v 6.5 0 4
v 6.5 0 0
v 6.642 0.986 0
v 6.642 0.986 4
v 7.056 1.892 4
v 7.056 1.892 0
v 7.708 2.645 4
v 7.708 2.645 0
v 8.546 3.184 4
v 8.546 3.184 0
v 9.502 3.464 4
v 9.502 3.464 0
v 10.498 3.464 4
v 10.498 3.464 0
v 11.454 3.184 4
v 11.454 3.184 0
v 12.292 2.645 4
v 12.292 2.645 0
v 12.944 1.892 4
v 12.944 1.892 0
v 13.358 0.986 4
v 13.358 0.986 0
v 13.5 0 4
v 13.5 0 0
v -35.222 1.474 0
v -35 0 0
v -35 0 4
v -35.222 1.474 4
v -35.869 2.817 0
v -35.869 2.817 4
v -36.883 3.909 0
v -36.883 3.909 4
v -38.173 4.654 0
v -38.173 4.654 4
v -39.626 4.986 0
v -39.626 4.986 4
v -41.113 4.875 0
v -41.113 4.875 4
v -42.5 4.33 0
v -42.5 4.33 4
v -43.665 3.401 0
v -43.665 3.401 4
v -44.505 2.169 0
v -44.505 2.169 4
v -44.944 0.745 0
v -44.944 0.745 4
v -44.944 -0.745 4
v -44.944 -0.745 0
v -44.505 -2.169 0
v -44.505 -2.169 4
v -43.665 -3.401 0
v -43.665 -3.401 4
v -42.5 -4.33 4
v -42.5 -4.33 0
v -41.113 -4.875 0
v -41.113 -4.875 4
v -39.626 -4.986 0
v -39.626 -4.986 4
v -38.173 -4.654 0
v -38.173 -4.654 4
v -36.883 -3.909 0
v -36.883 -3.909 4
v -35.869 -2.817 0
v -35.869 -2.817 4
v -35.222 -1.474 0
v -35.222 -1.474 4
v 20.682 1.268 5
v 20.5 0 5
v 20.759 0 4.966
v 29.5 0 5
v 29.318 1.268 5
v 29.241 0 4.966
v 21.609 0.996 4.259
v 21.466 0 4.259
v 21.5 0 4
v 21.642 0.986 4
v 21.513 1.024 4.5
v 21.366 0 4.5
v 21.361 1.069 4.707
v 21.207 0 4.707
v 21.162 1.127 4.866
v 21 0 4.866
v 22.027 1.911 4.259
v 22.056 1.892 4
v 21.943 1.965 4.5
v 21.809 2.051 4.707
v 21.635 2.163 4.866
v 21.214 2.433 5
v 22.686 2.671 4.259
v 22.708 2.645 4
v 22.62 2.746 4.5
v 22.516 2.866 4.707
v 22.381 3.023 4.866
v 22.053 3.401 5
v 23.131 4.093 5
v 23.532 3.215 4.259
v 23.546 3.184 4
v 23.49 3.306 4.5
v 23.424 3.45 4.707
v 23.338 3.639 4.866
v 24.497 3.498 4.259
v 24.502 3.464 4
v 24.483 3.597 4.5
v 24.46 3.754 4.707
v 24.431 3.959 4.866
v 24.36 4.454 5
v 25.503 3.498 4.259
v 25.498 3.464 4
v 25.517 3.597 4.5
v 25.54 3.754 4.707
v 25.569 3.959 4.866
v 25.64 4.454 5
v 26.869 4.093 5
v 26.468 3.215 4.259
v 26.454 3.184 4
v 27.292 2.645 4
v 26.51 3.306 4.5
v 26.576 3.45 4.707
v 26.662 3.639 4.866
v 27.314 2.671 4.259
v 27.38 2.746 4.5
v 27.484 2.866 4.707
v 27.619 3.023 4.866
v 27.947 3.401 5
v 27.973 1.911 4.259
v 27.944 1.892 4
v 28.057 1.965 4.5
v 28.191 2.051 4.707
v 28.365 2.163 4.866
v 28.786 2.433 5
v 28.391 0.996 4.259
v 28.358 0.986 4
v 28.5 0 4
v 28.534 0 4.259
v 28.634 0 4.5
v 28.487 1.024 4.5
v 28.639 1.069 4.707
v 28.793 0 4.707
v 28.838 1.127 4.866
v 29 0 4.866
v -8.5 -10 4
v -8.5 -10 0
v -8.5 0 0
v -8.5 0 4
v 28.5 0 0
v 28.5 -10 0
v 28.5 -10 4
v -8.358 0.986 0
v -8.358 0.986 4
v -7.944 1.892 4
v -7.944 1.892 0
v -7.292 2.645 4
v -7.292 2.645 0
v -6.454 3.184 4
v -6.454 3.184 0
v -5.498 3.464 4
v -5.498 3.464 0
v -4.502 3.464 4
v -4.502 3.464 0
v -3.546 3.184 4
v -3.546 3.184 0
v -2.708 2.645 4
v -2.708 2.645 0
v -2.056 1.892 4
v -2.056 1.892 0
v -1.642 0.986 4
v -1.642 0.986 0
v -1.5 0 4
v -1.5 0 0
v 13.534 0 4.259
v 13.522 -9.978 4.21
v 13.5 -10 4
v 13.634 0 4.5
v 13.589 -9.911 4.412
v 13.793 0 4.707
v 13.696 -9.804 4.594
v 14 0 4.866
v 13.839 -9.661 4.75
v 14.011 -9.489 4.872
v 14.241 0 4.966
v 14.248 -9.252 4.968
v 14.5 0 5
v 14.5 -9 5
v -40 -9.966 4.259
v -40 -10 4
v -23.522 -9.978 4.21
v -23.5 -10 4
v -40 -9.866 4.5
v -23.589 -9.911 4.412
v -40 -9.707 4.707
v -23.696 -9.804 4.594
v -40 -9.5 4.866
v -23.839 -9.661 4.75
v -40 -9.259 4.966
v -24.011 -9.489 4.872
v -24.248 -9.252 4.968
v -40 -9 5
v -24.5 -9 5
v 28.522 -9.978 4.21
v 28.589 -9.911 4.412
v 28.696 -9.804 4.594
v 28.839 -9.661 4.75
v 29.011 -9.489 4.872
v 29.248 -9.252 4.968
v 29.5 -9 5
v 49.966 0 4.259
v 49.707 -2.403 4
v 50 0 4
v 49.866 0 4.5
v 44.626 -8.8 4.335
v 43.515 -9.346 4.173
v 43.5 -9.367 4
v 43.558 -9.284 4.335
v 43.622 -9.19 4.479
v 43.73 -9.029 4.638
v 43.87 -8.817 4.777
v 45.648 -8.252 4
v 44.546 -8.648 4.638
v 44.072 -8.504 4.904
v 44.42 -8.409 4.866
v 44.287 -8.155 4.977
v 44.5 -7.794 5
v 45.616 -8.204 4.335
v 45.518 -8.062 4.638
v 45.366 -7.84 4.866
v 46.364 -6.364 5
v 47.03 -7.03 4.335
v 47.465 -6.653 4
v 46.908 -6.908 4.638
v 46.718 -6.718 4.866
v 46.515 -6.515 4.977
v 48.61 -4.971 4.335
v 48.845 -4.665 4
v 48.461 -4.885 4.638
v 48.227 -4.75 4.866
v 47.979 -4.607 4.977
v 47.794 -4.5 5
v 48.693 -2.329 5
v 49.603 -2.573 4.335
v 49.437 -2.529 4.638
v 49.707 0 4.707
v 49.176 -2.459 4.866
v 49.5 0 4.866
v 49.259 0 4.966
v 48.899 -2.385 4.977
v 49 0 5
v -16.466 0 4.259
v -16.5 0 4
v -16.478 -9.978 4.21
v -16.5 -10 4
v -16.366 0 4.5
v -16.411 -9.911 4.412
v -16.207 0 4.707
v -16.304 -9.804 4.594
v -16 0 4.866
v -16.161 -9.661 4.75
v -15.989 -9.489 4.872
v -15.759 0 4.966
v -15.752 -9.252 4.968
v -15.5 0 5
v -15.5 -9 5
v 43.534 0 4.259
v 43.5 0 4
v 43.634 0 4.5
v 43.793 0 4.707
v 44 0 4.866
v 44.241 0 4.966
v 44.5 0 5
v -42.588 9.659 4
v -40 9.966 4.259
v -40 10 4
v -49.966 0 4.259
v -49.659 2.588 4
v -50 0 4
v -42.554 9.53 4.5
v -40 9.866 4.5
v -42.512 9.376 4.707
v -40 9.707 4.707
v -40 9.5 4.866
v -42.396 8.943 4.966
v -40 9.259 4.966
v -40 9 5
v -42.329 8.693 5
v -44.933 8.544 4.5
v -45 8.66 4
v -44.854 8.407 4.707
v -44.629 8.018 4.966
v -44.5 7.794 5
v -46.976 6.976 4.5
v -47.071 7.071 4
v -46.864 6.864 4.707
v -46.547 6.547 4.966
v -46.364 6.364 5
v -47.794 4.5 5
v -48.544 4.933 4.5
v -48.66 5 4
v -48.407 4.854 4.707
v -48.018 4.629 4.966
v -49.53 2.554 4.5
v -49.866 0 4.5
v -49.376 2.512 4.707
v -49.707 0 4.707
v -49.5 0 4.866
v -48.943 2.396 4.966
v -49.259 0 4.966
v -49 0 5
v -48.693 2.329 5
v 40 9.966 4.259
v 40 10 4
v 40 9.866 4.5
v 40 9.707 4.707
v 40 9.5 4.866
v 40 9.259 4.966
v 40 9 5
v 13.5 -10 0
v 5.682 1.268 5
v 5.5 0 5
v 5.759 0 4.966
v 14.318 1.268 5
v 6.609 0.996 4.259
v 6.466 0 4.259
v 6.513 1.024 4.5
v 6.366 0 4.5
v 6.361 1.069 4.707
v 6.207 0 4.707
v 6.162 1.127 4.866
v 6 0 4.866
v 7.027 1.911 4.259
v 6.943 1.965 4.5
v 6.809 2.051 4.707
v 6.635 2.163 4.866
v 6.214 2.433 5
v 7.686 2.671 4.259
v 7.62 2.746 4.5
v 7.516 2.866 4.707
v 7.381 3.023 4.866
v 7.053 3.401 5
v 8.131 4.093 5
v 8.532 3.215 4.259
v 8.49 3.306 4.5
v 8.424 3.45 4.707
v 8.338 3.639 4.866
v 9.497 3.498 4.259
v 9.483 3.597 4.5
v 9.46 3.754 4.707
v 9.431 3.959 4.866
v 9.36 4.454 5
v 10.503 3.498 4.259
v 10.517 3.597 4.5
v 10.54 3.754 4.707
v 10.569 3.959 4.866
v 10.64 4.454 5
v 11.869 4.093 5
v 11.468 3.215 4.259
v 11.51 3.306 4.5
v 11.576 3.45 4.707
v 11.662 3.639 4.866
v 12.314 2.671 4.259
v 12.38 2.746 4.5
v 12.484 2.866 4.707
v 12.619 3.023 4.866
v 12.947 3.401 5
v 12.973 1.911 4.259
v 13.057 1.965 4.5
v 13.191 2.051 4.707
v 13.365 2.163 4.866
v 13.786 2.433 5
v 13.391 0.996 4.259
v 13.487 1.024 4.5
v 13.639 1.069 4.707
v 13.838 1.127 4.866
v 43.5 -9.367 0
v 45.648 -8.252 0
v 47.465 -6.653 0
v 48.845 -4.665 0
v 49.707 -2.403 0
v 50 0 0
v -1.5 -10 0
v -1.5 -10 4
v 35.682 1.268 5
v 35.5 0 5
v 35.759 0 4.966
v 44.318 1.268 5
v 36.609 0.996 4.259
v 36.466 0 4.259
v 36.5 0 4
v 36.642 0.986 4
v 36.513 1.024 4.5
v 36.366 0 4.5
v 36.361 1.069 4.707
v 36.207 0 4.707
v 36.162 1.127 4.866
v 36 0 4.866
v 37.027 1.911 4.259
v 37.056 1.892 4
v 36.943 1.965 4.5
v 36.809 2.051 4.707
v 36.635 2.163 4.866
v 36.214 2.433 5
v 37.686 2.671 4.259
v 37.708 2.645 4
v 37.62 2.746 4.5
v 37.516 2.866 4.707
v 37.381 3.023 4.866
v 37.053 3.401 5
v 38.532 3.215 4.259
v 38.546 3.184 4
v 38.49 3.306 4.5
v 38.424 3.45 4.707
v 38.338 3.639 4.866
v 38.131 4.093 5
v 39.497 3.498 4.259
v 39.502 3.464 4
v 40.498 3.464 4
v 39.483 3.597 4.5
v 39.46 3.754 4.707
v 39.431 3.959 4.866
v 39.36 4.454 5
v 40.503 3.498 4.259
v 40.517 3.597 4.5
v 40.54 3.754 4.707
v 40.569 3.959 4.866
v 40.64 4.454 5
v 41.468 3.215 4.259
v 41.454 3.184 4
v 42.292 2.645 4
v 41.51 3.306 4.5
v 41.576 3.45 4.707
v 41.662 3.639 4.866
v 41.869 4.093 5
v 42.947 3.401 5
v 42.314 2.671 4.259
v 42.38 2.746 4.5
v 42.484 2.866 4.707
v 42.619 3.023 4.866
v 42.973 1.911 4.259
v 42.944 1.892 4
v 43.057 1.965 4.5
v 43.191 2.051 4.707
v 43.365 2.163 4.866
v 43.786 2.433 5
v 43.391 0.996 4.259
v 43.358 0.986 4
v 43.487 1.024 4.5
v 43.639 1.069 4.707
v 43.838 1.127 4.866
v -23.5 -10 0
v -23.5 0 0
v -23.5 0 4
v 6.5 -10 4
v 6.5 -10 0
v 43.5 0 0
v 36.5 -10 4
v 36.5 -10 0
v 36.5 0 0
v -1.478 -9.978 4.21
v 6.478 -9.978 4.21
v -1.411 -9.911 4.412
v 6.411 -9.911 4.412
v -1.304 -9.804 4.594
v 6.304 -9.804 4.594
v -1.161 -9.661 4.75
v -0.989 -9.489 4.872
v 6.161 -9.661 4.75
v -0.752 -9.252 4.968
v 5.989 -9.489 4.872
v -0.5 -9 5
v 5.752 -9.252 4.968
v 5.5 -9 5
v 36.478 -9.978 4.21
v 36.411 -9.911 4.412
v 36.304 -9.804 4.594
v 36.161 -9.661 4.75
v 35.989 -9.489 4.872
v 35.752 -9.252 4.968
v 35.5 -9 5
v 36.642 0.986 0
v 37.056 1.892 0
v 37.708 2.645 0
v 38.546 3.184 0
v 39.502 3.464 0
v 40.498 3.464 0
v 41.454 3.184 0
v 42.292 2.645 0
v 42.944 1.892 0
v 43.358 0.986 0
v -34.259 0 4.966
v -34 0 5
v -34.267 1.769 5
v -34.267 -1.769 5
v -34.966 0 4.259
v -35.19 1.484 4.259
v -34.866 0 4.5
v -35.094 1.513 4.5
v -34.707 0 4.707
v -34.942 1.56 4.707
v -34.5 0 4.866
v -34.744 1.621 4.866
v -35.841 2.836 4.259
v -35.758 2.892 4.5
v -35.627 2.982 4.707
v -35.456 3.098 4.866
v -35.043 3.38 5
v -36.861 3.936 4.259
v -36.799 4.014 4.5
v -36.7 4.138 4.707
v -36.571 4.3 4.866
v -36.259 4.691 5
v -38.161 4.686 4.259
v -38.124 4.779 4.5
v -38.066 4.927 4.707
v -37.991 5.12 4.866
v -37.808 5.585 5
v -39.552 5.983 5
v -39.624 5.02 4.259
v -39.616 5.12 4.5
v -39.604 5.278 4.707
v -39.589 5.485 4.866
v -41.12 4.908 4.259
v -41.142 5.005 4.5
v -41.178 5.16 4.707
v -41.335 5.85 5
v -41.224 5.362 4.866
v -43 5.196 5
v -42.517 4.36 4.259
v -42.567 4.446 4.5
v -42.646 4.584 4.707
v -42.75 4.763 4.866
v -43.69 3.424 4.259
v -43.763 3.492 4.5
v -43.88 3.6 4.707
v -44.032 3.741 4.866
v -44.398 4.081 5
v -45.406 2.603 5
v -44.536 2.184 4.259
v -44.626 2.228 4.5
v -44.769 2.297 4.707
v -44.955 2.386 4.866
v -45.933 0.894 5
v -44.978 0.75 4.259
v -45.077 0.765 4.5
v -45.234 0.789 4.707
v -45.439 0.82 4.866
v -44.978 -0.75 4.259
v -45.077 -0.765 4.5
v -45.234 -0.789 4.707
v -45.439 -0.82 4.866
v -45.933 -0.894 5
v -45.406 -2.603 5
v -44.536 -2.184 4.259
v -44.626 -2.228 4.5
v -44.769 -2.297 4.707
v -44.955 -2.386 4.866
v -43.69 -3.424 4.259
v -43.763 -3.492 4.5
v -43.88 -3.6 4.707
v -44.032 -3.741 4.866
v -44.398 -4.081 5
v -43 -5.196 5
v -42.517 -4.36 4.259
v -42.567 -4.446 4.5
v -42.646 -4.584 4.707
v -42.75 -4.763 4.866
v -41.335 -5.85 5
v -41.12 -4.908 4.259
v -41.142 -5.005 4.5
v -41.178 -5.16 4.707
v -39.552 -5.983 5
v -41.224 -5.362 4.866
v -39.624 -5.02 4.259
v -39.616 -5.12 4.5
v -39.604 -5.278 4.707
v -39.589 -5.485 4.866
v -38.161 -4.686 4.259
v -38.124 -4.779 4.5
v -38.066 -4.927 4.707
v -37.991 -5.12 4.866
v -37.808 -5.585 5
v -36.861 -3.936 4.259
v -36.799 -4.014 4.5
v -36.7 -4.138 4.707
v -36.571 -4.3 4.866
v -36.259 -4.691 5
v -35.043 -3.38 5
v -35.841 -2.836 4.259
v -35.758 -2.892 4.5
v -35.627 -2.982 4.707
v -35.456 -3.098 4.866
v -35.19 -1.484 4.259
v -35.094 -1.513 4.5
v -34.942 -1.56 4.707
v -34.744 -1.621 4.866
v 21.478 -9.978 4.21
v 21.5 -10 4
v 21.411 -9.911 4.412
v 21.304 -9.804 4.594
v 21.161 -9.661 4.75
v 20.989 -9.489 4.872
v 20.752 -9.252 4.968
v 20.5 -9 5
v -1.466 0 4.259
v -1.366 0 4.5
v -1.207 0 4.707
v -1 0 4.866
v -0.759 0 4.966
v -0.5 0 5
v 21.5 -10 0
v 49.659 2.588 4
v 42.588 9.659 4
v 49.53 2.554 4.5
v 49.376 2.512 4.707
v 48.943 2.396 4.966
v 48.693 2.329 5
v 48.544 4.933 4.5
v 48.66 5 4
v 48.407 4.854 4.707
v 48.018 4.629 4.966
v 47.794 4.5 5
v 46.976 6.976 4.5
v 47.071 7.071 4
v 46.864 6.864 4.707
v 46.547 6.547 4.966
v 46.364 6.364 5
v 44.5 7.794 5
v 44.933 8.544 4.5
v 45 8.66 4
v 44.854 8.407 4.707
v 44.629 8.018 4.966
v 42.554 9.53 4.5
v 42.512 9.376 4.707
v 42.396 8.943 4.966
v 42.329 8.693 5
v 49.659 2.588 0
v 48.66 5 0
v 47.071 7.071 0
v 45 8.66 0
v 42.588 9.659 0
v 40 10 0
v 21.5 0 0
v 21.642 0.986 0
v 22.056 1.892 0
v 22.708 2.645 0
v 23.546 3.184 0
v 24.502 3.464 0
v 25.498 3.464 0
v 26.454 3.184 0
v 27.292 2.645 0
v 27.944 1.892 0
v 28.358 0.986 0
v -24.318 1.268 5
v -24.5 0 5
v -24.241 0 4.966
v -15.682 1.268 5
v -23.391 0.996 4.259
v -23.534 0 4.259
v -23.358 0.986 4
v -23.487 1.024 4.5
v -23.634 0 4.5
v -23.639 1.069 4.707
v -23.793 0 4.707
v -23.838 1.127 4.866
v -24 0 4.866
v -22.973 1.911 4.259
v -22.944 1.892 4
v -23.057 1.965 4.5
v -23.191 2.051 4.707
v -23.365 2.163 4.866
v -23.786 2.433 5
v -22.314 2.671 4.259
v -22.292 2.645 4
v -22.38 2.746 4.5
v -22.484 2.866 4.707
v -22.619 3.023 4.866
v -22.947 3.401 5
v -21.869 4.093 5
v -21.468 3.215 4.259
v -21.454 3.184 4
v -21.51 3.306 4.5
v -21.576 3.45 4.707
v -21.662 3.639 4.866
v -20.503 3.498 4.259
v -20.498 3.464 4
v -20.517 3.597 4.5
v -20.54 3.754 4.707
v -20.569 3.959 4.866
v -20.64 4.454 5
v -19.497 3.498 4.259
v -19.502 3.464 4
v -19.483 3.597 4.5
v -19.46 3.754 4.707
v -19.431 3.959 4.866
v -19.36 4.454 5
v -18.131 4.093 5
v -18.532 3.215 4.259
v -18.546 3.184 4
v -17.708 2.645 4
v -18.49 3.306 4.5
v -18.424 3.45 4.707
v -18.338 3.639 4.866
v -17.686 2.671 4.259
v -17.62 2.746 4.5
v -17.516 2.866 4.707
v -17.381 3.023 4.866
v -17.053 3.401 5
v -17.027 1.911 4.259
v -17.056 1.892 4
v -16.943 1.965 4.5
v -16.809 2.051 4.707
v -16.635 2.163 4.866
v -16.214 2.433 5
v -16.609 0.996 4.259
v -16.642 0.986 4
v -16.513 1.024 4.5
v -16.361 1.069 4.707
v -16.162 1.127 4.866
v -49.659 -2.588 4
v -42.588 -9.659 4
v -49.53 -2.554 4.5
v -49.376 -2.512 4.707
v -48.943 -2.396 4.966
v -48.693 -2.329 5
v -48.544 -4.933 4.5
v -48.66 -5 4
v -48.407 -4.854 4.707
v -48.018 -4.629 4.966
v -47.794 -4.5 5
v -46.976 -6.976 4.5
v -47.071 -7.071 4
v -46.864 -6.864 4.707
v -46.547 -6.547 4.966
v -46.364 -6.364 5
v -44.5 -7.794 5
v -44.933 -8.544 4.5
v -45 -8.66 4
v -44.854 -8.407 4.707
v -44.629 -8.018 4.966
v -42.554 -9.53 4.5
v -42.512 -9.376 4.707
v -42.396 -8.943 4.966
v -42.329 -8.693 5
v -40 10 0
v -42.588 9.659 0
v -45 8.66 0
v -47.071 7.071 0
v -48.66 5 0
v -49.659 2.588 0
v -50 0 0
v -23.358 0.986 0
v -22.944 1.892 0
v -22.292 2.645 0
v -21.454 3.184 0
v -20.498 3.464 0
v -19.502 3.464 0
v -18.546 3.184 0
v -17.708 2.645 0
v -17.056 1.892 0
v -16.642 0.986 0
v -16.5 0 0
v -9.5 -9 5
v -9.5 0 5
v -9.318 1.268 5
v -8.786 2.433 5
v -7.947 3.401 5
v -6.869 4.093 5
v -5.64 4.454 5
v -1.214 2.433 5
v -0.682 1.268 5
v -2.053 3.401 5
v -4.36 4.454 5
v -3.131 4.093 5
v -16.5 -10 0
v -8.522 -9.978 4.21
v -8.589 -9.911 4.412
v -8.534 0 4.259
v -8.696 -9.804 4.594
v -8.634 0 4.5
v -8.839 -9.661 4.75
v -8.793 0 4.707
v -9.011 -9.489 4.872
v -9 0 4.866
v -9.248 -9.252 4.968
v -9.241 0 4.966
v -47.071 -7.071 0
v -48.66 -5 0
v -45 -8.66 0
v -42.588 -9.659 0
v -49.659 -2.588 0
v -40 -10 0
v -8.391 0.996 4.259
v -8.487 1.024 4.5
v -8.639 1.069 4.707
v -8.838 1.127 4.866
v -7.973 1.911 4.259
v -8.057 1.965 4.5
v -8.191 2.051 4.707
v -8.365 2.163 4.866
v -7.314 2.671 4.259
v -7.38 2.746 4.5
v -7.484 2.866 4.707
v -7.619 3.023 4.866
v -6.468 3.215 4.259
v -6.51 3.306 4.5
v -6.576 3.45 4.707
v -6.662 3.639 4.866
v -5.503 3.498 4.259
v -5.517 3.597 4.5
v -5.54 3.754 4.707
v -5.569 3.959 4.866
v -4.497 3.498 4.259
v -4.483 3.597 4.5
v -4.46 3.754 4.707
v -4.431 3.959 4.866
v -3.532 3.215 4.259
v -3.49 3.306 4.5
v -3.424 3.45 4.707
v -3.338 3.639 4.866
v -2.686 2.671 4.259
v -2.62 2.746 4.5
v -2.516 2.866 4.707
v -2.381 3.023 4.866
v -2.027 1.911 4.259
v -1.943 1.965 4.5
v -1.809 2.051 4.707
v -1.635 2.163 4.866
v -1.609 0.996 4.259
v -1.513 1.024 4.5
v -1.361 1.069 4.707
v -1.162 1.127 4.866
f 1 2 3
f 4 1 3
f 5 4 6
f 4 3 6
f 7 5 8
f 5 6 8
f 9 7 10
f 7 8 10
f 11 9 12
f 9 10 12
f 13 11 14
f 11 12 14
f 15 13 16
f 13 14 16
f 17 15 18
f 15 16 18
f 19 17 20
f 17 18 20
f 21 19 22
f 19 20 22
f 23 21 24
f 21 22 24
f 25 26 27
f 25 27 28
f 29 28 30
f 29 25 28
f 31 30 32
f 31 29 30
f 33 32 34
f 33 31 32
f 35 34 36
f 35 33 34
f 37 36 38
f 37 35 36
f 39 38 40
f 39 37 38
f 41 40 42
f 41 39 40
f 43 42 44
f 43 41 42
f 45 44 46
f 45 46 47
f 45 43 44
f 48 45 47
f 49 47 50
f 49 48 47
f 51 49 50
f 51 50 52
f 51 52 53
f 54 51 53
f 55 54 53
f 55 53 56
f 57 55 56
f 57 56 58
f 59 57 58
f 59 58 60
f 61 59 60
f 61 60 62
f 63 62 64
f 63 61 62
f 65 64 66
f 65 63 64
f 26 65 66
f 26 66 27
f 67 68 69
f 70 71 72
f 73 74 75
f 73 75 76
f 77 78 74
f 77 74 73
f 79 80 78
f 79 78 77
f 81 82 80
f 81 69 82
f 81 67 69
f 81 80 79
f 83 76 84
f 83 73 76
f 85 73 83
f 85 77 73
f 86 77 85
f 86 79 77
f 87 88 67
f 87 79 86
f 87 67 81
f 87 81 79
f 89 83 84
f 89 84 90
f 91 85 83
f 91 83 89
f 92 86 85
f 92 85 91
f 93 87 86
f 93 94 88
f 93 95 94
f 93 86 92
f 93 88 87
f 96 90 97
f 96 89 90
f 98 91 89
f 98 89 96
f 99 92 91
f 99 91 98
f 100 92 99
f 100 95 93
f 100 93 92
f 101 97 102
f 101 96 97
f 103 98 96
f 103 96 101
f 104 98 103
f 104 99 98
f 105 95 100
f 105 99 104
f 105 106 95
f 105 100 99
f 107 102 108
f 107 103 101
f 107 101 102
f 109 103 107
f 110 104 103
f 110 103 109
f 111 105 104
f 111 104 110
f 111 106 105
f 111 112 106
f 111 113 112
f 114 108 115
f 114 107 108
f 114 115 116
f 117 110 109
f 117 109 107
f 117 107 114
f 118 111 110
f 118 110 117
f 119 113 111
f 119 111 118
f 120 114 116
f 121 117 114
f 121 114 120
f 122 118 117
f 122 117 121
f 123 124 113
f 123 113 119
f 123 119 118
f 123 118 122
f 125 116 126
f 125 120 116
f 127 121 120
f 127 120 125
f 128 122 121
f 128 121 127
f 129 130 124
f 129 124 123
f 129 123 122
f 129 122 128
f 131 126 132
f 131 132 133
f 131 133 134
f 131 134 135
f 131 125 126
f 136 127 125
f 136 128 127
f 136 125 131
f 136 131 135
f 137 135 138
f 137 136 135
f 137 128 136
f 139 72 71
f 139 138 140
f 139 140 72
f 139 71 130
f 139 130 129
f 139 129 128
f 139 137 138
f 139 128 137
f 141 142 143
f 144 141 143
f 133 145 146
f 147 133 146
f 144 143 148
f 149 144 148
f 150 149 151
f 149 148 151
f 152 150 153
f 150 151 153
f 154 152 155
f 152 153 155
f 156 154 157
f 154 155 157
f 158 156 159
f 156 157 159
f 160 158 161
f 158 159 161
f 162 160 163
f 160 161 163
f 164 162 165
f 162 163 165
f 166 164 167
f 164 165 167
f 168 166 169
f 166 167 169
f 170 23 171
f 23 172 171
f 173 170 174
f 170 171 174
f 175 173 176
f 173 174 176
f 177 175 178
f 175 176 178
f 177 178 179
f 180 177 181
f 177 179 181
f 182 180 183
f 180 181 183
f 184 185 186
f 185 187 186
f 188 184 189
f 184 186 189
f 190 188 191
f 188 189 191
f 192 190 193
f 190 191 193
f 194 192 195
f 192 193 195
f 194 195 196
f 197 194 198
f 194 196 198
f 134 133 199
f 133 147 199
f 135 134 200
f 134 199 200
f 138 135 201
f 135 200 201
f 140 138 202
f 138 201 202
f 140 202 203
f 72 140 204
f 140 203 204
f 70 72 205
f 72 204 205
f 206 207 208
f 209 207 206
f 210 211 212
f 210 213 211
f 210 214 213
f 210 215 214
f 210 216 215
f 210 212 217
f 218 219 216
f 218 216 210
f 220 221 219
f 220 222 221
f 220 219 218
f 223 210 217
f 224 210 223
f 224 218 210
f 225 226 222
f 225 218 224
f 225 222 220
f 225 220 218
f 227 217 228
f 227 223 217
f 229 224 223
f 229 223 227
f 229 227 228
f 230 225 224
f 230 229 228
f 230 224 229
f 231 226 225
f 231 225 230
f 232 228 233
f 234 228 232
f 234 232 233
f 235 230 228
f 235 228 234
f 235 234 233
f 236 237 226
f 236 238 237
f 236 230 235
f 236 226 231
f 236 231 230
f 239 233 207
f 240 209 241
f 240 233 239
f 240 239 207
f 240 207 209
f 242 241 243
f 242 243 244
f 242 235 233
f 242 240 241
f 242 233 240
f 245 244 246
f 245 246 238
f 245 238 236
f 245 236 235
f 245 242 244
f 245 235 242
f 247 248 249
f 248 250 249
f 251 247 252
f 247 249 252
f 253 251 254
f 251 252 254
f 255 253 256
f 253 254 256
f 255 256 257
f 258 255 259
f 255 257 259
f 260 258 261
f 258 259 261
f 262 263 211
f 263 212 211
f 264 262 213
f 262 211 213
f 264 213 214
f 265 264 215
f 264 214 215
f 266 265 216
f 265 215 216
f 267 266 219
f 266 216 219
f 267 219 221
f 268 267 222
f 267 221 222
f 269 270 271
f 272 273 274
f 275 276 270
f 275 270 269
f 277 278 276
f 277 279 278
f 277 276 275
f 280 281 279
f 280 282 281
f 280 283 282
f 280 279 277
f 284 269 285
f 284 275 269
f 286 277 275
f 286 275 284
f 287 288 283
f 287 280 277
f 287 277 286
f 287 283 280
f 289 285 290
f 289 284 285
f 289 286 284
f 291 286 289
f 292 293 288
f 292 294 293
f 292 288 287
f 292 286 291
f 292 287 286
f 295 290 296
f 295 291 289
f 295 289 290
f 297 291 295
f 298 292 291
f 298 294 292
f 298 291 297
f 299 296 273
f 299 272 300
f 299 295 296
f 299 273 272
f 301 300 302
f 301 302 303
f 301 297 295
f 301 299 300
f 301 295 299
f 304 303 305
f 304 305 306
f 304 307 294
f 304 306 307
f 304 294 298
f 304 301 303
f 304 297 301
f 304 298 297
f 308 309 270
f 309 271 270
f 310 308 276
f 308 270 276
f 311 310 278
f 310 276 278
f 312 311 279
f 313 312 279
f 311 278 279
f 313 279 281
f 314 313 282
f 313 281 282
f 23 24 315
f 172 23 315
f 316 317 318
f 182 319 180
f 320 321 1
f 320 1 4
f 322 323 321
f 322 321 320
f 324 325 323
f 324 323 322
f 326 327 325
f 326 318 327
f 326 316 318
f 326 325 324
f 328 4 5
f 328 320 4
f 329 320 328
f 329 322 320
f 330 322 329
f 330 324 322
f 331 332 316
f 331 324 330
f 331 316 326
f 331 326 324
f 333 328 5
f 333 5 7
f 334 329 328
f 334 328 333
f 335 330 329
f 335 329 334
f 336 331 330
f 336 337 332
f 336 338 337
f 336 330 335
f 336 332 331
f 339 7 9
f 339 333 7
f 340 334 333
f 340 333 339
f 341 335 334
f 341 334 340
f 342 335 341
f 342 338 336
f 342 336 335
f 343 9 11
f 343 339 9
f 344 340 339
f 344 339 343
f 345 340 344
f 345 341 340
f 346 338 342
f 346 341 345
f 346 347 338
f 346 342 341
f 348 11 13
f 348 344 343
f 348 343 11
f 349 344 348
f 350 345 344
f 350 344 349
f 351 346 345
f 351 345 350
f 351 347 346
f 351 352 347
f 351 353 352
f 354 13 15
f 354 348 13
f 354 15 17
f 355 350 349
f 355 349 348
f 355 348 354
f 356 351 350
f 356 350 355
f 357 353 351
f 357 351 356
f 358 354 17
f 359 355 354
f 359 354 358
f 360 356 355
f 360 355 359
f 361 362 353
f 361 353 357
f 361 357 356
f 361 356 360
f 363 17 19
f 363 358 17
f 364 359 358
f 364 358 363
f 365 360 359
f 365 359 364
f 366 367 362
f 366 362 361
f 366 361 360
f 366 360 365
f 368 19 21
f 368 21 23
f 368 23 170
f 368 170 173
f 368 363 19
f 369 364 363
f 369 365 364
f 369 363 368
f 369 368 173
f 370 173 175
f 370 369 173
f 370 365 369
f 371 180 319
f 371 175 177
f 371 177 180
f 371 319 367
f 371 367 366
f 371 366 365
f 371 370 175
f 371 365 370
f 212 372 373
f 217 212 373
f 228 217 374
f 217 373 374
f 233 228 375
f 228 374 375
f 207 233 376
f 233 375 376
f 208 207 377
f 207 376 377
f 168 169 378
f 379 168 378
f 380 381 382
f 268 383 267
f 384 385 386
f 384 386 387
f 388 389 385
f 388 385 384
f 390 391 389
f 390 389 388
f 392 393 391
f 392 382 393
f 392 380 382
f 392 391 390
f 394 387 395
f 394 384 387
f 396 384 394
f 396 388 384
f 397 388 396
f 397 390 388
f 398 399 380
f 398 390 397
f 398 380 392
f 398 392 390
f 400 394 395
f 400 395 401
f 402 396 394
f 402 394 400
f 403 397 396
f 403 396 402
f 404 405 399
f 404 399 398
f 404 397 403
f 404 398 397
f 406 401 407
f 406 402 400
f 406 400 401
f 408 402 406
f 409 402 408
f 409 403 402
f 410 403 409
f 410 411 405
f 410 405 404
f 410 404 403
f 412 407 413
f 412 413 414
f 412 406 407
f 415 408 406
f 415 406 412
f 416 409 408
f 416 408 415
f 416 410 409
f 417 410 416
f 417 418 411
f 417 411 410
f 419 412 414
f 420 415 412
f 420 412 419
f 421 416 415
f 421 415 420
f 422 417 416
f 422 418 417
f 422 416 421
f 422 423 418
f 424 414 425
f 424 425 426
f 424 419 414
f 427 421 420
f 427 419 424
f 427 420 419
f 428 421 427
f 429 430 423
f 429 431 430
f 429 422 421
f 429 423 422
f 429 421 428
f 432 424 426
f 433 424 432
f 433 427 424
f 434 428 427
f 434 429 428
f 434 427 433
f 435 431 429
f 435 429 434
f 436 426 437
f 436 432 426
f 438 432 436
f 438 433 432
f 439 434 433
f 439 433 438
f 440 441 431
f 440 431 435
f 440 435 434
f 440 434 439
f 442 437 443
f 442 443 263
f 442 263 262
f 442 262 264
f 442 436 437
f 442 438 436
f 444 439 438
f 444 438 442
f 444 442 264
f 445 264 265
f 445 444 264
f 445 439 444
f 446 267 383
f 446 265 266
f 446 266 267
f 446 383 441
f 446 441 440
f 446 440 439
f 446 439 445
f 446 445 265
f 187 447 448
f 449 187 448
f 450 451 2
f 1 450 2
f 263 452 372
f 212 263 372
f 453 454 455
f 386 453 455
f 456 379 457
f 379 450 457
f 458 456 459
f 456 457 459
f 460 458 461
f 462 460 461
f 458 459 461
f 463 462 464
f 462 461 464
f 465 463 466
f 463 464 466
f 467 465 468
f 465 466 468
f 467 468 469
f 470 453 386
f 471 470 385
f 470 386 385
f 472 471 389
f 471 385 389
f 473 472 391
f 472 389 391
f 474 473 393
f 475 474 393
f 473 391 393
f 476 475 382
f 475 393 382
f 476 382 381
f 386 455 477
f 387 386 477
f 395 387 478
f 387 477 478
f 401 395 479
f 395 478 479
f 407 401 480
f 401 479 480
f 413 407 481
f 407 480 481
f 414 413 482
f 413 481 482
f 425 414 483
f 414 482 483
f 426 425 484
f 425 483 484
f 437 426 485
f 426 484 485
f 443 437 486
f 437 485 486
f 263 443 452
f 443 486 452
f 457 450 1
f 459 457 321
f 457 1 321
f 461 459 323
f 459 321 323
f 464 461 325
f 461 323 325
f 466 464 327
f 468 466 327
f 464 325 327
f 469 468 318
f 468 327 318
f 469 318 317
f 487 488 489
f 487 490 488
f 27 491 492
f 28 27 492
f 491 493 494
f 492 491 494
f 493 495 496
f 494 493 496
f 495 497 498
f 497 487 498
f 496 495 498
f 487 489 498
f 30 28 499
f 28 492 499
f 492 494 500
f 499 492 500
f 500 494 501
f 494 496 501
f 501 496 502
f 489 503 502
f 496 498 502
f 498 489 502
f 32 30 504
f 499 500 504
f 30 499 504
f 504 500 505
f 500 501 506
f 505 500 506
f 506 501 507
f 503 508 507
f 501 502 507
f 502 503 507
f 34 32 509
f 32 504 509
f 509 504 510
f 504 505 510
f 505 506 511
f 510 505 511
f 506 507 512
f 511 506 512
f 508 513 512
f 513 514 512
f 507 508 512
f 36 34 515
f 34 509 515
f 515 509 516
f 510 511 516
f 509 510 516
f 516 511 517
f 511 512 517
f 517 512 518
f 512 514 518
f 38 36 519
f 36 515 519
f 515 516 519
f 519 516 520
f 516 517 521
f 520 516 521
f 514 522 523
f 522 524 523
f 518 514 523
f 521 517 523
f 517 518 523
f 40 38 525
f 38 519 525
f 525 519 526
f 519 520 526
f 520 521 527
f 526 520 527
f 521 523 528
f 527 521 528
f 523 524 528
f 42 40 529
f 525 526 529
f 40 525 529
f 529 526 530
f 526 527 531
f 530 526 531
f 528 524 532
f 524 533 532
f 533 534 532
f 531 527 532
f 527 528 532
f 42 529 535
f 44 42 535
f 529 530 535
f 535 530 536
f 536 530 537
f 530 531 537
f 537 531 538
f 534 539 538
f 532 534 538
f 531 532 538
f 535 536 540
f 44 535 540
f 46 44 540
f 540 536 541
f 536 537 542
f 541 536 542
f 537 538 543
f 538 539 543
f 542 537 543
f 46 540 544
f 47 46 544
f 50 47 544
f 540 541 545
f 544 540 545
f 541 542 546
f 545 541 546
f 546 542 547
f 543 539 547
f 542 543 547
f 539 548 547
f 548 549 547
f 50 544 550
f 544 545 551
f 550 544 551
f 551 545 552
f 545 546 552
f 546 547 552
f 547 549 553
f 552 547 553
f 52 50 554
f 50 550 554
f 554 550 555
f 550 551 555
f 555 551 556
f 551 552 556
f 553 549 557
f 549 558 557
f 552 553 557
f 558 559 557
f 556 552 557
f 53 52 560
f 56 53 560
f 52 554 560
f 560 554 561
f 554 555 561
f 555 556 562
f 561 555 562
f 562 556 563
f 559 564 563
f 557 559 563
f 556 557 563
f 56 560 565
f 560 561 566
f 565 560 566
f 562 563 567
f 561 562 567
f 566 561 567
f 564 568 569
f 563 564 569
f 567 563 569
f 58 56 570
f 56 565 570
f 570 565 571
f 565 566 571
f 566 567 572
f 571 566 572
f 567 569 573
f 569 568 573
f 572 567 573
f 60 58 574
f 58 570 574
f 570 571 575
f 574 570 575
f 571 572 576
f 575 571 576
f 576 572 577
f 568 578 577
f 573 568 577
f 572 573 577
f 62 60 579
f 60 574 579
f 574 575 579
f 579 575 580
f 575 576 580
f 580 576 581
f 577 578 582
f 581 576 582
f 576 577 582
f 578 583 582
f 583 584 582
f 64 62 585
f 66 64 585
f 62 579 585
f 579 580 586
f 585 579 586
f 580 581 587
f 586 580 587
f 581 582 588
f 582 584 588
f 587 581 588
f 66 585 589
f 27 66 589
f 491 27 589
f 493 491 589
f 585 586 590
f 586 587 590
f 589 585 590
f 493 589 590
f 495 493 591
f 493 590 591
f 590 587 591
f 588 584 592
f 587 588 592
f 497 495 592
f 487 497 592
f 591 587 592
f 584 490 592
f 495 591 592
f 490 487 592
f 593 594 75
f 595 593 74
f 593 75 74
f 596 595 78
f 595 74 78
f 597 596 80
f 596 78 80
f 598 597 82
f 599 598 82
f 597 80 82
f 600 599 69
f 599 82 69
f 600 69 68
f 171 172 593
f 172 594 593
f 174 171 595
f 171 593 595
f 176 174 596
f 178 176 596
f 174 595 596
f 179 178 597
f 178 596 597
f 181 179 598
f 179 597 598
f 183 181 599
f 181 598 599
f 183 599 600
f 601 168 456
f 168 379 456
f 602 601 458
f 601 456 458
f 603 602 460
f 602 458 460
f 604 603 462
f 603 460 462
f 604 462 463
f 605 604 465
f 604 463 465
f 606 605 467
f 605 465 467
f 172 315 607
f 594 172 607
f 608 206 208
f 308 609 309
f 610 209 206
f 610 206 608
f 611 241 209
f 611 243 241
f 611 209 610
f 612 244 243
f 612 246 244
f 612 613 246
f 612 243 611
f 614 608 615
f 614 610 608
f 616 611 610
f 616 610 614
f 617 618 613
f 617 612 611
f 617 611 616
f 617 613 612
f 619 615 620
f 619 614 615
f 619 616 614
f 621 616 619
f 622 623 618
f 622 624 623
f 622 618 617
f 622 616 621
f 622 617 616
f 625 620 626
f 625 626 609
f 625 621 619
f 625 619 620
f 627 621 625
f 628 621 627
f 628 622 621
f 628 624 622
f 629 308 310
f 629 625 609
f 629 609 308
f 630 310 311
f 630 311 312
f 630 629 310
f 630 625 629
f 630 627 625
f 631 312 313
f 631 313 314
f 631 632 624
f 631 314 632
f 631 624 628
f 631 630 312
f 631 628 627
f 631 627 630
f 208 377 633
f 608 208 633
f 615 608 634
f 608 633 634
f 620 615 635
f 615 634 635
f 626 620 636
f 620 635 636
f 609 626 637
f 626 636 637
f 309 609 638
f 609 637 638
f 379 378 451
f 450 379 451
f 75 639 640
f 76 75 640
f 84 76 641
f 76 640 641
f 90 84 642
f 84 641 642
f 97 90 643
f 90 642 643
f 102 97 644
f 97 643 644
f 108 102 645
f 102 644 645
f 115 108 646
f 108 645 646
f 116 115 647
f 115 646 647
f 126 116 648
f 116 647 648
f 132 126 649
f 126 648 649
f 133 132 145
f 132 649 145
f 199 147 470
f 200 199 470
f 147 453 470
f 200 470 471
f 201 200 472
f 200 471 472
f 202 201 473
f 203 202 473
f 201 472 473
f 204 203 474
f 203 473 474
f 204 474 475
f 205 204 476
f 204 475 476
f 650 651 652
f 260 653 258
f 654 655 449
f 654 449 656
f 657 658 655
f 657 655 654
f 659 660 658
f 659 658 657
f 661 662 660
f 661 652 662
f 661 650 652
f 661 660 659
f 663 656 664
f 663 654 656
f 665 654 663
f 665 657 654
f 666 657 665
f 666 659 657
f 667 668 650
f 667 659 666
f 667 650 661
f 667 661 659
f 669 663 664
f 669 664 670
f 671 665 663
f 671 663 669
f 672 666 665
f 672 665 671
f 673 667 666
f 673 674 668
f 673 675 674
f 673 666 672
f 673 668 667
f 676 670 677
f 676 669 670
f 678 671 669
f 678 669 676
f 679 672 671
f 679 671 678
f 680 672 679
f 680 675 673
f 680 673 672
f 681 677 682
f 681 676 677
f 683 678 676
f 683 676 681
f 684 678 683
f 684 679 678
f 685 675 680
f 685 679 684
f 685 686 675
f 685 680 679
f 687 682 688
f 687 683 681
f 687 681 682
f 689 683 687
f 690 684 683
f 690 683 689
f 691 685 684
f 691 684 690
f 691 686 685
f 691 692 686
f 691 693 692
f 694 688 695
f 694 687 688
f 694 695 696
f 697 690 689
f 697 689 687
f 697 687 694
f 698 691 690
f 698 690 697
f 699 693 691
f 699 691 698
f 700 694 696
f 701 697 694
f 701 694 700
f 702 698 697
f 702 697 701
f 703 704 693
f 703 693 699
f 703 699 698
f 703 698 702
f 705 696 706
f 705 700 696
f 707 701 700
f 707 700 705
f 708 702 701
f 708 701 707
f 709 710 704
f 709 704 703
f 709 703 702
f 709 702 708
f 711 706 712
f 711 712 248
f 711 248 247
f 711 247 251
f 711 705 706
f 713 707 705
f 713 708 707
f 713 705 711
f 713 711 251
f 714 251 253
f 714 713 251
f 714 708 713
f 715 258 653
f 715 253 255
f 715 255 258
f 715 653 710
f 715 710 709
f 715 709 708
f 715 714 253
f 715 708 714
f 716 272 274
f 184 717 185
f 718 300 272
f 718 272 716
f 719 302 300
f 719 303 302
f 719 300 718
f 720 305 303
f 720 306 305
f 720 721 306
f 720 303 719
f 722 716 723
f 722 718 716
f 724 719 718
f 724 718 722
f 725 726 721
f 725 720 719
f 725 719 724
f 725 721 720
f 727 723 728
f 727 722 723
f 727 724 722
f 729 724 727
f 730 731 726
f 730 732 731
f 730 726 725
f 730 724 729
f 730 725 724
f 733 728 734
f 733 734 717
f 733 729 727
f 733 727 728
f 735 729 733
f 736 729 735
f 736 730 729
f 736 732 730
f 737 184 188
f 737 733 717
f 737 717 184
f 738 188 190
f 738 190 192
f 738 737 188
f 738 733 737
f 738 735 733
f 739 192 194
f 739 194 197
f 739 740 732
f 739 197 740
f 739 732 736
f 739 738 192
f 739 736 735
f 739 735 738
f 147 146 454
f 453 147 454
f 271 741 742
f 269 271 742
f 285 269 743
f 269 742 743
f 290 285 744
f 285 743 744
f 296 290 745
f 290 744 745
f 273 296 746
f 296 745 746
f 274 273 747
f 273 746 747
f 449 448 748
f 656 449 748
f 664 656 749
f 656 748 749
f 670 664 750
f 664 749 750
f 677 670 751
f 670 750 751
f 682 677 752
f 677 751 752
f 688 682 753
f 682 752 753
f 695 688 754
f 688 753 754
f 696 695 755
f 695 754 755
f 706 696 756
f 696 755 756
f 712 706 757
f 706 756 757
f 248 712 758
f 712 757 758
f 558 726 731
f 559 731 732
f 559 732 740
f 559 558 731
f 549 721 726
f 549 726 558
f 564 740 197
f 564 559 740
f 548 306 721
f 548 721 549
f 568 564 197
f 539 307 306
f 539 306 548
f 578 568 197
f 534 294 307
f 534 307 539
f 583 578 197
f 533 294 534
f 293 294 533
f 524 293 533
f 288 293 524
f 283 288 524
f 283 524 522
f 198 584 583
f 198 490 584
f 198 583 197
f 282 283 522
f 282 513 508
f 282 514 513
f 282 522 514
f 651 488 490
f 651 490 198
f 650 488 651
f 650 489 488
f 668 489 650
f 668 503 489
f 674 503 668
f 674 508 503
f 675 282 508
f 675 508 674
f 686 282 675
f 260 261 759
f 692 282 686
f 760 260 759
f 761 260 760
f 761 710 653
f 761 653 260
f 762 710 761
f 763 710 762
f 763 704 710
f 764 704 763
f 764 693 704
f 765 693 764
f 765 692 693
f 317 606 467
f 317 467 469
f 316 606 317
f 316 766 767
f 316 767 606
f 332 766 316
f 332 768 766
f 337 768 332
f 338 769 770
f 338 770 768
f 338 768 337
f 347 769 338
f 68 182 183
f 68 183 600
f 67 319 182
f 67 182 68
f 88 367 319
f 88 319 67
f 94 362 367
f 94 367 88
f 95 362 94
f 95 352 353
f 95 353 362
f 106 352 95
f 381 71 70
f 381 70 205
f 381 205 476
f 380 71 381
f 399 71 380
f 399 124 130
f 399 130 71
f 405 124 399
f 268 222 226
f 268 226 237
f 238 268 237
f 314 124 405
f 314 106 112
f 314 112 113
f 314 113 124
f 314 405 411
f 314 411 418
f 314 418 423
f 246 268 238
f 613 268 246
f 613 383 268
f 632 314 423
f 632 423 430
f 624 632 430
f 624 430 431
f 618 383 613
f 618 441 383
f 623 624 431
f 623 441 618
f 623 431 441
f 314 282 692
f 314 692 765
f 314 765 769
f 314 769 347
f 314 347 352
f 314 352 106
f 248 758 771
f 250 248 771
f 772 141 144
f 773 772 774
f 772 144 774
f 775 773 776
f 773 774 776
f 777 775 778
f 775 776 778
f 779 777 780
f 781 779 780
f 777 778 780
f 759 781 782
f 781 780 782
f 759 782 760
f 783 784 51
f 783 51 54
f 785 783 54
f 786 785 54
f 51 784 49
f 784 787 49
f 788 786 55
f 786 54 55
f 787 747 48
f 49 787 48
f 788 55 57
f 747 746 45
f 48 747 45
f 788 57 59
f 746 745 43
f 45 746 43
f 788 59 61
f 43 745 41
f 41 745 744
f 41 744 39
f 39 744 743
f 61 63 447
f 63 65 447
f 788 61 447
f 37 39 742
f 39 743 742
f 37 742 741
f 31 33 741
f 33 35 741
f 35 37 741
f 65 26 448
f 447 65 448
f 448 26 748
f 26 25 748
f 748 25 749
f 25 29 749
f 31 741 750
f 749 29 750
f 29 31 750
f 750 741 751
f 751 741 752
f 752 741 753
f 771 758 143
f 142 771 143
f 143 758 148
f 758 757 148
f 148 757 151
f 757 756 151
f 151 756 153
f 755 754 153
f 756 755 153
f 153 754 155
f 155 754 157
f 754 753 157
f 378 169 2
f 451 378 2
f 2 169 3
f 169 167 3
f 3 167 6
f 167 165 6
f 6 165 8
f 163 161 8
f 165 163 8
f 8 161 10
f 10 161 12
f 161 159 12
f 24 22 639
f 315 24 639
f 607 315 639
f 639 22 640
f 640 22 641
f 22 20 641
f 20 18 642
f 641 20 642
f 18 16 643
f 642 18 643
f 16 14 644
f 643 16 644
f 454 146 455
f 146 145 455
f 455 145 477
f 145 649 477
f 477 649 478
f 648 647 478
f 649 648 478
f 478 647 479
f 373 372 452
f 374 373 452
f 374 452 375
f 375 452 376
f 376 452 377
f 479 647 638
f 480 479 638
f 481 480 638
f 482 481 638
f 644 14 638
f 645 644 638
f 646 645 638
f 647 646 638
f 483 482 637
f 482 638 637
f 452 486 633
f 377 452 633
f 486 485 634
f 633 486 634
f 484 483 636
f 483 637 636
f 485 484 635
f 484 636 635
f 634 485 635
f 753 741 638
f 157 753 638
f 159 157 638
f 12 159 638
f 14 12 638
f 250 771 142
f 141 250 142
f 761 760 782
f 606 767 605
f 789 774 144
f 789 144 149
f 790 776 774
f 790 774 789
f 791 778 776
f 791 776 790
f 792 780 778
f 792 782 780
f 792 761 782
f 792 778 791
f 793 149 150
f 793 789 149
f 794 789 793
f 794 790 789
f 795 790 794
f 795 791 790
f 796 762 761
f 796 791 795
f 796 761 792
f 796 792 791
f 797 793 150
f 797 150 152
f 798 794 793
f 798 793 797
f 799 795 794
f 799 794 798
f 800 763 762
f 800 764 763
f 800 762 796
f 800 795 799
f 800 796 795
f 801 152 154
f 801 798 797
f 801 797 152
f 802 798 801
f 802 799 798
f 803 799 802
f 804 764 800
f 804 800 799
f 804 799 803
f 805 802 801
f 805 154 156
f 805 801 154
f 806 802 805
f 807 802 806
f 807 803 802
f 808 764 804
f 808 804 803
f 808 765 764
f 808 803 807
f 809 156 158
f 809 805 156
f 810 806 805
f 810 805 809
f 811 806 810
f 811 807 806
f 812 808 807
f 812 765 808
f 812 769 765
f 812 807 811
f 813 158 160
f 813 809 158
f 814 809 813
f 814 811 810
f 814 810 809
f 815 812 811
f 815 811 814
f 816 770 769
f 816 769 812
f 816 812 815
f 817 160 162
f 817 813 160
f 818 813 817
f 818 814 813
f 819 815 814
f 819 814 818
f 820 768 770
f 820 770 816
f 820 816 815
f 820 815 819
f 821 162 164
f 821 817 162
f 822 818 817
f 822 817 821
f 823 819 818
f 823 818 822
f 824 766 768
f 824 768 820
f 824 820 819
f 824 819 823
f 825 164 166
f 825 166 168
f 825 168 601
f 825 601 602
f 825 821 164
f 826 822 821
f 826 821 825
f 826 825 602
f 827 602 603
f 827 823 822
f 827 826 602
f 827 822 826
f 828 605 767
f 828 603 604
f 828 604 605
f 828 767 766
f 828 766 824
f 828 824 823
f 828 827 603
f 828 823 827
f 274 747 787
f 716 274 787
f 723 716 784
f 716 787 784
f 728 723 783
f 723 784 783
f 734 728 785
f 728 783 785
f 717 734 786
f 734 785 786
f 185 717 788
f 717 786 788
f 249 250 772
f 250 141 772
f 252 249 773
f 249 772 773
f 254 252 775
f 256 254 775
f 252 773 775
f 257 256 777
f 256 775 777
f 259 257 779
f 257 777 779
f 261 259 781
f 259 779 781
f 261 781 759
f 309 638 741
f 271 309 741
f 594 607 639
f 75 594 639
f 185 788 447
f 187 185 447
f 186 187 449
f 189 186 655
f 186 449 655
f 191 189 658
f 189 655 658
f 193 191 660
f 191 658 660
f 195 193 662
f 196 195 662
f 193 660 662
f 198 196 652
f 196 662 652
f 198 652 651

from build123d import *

# Parameters (mm, degrees)
F0_R     = 5
F1_DEPTH = 5
F2_R     = 1


with BuildPart() as f1:
    # F0 (on Top) → F1 (new body)
    with BuildSketch(Plane.XY):
        with BuildLine():
            Line((28.5, -10), (36.5, -10))
            Line((36.5, -10), (36.5, 0))
            ThreePointArc((36.5, 0), (40, 3.5), (43.5, 0))
            Line((43.5, 0), (43.5, -9.3674969976))
            ThreePointArc((43.5, -9.3674969976), (48.2158383626, -5.7008771255), (50, 0))
            ThreePointArc((50, 0), (47.0710678119, 7.0710678119), (40, 10))
            Line((40, 10), (-40, 10))
            ThreePointArc((-40, 10), (-47.0710678119, 7.0710678119), (-50, 0))
            ThreePointArc((-50, 0), (-47.0710678119, -7.0710678119), (-40, -10))
            Line((-40, -10), (-23.5, -10))
            Line((-23.5, -10), (-23.5, 0))
            ThreePointArc((-23.5, 0), (-20, 3.5), (-16.5, 0))
            Line((-16.5, 0), (-16.5, -10))
            Line((-16.5, -10), (-8.5, -10))
            Line((-8.5, -10), (-8.5, 0))
            ThreePointArc((-8.5, 0), (-5, 3.5), (-1.5, 0))
            Line((-1.5, 0), (-1.5, -10))
            Line((-1.5, -10), (6.5, -10))
            Line((6.5, -10), (6.5, 0))
            ThreePointArc((6.5, 0), (10, 3.5), (13.5, 0))
            Line((13.5, 0), (13.5, -10))
            Line((13.5, -10), (21.5, -10))
            Line((21.5, -10), (21.5, 0))
            ThreePointArc((21.5, 0), (25, 3.5), (28.5, 0))
            Line((28.5, 0), (28.5, -10))
        make_face()
        with Locations((-40, 0)):
            Circle(F0_R, mode=Mode.SUBTRACT)
    extrude(amount=F1_DEPTH)

    # F2
    f2_edges = [f1.edges().sort_by_distance(p)[0] for p in [
        (-31.75, -10, 5),
        (-50, 0, 5),
        (-12.5, -10, 5),
        (2.5, -10, 5),
        (17.5, -10, 5),
        (32.5, -10, 5),
        (49.840604, 1.778346, 5),
        (0, 10, 5),
        (-45, 0, 5),
        (-23.5, -5, 5),
        (-20, 3.5, 5),
        (-16.5, -5, 5),
        (-8.5, -5, 5),
        (6.5, -5, 5),
        (21.5, -5, 5),
        (40, 3.5, 5),
    ]]
    fillet(f2_edges, radius=F2_R)


solid = f1.part
